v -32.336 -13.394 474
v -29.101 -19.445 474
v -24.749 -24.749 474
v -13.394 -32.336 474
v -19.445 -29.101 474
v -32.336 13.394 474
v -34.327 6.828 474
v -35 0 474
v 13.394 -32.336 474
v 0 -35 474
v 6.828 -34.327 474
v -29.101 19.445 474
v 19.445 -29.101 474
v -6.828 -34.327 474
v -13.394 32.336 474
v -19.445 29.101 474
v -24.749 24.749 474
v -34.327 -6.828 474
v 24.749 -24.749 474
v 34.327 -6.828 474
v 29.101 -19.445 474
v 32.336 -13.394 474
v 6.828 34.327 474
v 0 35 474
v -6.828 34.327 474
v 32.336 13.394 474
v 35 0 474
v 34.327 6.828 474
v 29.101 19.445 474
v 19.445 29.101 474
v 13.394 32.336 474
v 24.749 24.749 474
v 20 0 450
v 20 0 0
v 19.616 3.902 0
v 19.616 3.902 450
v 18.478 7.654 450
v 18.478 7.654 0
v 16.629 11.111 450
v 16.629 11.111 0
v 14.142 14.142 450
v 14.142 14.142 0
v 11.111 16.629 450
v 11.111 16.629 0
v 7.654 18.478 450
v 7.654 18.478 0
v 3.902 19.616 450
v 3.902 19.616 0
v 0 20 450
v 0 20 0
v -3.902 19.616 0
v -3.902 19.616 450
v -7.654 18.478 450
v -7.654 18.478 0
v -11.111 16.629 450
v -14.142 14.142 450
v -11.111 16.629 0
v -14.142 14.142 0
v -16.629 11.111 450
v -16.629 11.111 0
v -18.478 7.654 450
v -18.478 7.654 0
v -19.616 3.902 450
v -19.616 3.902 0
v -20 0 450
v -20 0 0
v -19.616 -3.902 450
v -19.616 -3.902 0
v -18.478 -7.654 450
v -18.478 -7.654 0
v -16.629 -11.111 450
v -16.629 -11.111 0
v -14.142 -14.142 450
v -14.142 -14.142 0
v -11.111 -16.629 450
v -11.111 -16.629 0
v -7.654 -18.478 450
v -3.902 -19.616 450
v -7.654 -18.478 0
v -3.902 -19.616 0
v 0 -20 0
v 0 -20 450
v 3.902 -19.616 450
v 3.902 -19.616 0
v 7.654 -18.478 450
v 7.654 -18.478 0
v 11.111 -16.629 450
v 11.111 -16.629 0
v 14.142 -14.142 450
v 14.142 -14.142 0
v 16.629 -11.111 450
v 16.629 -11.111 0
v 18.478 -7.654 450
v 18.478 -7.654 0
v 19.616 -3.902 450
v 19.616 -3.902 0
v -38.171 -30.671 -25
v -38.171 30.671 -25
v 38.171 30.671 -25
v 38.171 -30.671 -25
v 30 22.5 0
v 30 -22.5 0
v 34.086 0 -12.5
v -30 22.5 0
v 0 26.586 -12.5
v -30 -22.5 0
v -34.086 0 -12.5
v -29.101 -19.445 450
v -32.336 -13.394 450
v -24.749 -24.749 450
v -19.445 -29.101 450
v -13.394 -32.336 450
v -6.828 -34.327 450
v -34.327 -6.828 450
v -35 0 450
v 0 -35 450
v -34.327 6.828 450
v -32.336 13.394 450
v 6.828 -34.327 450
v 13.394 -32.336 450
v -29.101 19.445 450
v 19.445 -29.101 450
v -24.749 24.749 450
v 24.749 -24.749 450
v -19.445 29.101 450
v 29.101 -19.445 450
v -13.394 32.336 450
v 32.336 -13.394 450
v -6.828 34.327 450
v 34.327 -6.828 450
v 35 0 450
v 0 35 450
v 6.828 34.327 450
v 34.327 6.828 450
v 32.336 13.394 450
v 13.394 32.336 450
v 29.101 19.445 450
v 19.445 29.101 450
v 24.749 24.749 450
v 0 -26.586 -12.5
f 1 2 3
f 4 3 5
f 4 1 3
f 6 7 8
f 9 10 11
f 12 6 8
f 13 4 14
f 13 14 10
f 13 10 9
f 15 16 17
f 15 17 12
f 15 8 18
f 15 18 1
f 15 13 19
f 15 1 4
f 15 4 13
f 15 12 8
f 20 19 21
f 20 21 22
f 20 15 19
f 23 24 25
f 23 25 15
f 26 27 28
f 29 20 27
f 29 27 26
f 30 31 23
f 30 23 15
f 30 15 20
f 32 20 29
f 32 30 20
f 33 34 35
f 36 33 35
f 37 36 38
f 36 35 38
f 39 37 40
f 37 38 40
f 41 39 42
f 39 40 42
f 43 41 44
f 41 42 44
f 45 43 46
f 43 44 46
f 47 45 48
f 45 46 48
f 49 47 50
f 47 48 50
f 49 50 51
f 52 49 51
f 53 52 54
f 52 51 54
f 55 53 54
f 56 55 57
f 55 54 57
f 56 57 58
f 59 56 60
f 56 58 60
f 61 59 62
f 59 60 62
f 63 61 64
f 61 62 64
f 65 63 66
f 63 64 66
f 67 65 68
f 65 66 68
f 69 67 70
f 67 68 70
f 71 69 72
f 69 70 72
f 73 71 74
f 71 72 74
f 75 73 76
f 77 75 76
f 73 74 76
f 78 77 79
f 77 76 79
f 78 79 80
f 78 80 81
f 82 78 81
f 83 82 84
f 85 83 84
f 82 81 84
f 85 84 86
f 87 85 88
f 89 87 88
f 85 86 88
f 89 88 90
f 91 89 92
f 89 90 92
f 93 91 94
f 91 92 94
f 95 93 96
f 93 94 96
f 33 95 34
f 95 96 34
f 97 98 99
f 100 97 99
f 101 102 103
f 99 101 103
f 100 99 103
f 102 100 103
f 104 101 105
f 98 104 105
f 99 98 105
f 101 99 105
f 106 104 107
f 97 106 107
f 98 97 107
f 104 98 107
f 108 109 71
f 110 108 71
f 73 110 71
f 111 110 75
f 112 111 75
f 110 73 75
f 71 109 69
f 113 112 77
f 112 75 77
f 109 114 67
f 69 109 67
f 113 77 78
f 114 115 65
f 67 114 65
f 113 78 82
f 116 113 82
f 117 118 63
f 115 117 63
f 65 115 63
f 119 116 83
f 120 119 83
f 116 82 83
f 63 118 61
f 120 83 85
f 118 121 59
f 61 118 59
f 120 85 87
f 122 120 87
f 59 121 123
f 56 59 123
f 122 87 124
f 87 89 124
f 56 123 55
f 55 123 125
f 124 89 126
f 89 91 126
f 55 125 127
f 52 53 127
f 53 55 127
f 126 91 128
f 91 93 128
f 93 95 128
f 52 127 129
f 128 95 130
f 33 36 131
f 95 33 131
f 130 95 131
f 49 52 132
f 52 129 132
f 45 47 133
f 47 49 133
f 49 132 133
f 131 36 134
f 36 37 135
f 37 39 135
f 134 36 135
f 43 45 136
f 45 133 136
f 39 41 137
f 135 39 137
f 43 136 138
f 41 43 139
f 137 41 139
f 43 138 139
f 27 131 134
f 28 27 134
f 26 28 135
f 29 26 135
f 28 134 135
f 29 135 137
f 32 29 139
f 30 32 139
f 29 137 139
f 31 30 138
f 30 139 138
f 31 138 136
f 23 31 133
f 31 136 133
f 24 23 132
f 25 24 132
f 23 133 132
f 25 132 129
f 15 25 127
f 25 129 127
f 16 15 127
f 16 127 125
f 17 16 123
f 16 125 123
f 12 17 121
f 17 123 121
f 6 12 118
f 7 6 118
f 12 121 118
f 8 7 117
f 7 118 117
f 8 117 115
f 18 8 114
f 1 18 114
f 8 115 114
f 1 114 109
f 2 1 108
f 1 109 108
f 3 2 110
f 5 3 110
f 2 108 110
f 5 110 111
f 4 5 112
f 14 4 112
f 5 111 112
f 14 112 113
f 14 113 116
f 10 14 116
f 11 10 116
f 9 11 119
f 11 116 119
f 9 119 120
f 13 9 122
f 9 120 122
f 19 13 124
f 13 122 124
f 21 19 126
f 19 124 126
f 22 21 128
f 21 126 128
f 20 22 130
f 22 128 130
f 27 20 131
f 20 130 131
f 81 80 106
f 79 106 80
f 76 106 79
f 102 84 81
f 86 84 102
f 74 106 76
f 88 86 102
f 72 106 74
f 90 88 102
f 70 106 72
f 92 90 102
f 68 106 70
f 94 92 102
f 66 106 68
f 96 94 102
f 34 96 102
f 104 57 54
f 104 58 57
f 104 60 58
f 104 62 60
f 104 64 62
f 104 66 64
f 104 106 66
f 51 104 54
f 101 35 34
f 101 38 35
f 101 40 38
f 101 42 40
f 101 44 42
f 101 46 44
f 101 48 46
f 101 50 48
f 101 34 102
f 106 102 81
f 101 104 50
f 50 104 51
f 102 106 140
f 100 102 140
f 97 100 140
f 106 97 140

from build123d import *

# Parameters (mm, degrees)
F0_R     = 20
F1_DEPTH = 450
F2_R     = 35
F3_DEPTH = 24
F4_W     = 60
F4_H     = 45
F5_DEPTH = 25
F5_TAPER = -18.1


with BuildPart() as f1:
    # F0 (on Top) → F1 (new body)
    with BuildSketch(Plane.XY):
        Circle(F0_R)
    extrude(amount=F1_DEPTH)

    # F2 (on face) → F3 (join)
    with BuildSketch(Plane.XY.offset(450)):
        Circle(F2_R)
    extrude(amount=F3_DEPTH)

    # F4 (on Top) → F5 (join)
    with BuildSketch(Plane.XY):
        Rectangle(F4_W, F4_H)
    extrude(amount=-F5_DEPTH, taper=F5_TAPER)


solid = f1.part
